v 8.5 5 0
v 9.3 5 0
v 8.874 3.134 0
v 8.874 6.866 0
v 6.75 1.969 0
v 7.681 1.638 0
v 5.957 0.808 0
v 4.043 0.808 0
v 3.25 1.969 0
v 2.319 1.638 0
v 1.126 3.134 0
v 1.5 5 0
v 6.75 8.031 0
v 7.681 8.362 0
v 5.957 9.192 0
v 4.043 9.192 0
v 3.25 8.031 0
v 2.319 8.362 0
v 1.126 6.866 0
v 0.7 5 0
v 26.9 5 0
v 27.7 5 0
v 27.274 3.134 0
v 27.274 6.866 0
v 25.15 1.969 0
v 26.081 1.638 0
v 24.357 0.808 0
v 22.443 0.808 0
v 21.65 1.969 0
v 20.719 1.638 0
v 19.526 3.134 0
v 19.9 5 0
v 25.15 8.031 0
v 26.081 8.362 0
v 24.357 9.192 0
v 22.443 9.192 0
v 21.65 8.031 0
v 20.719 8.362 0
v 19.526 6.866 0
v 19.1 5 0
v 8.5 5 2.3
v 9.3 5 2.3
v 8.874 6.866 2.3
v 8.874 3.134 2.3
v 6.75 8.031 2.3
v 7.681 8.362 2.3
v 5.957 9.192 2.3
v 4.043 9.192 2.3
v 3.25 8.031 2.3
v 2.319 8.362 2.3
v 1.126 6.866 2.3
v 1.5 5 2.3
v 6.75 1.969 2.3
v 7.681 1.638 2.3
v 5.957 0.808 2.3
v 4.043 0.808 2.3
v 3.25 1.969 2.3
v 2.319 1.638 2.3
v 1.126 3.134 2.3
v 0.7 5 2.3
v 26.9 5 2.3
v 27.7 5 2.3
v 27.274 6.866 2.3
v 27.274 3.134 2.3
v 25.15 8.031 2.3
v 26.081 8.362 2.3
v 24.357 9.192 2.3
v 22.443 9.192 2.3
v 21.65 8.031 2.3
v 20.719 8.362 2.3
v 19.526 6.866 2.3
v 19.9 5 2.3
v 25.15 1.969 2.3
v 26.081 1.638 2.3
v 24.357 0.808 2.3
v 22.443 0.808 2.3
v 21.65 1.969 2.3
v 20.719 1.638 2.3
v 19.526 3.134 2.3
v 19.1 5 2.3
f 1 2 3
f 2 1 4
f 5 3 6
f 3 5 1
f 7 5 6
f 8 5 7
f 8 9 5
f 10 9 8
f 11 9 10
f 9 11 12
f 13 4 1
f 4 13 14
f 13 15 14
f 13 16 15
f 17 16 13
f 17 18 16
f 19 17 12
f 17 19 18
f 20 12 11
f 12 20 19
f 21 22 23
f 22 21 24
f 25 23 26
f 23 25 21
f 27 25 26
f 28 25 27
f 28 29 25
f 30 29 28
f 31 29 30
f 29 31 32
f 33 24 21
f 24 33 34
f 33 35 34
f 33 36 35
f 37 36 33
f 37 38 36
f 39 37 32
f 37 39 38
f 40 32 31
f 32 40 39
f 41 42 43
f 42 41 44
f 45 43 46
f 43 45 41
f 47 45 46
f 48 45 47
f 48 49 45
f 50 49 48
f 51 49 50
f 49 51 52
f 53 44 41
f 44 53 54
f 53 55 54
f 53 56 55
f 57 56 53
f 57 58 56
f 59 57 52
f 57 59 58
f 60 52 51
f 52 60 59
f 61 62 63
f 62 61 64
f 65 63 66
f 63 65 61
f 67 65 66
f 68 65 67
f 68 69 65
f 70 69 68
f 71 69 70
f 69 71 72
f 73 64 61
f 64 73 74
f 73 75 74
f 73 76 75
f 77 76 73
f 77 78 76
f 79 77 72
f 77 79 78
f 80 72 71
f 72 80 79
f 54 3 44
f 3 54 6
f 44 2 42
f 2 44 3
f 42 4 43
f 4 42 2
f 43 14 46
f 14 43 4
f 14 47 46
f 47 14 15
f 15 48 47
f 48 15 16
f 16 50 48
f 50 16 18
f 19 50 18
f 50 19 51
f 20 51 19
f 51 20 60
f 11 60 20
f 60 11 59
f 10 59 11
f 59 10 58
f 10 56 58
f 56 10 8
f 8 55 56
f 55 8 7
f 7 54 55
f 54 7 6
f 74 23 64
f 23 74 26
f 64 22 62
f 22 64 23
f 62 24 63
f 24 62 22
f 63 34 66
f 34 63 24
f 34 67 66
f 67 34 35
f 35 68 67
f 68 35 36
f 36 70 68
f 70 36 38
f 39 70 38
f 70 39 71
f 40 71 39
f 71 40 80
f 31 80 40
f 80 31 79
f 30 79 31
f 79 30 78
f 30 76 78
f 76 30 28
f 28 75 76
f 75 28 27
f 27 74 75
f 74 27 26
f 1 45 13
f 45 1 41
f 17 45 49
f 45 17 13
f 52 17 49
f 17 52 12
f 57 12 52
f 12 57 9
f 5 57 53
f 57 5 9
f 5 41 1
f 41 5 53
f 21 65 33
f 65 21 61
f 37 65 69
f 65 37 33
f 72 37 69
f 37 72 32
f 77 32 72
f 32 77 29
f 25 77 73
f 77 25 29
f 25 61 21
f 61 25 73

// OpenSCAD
// Copyright (C) 2025 Arif K. Rafiq
// This program is free software: you can redistribute it and/or modify
// it under the terms of the GNU General Public License as published by
// the Free Software Foundation, either version 3 of the License, or
// (at your option) any later version.

// This program is distributed in the hope that it will be useful,
// but WITHOUT ANY WARRANTY; without even the implied warranty of
// MERCHANTABILITY or FITNESS FOR A PARTICULAR PURPOSE.  See the
// GNU General Public License for more details.

// You should have received a copy of the GNU General Public License
// along with this file.  If not, see <https://www.gnu.org/licenses/>,
// or write to: license@temperedoptimism.com


// NOTHING SHOWS
// Fixed in example3.scad

tWallMin = 0.40;         // Limit for 3D printer, I have 0.2
pHexSink = [3.5, 2.3];
vTerminal0 = [5.0, 5.0];
vTerminal1 = [23.4, 5.0];

//19:31
difference(){
  // hex pocket surround
  linear_extrude(pHexSink.y){
    translate(vTerminal0)  circle(pHexSink.x +(tWallMin *2));
    translate(vTerminal1)  circle(pHexSink.x +(tWallMin *2));
  }
  
  linear_extrude(pHexSink.y){
      translate(vTerminal0)  circle(pHexSink.x, $fn=6);
      translate(vTerminal1)  circle(pHexSink.x, $fn=6);
  }
}
